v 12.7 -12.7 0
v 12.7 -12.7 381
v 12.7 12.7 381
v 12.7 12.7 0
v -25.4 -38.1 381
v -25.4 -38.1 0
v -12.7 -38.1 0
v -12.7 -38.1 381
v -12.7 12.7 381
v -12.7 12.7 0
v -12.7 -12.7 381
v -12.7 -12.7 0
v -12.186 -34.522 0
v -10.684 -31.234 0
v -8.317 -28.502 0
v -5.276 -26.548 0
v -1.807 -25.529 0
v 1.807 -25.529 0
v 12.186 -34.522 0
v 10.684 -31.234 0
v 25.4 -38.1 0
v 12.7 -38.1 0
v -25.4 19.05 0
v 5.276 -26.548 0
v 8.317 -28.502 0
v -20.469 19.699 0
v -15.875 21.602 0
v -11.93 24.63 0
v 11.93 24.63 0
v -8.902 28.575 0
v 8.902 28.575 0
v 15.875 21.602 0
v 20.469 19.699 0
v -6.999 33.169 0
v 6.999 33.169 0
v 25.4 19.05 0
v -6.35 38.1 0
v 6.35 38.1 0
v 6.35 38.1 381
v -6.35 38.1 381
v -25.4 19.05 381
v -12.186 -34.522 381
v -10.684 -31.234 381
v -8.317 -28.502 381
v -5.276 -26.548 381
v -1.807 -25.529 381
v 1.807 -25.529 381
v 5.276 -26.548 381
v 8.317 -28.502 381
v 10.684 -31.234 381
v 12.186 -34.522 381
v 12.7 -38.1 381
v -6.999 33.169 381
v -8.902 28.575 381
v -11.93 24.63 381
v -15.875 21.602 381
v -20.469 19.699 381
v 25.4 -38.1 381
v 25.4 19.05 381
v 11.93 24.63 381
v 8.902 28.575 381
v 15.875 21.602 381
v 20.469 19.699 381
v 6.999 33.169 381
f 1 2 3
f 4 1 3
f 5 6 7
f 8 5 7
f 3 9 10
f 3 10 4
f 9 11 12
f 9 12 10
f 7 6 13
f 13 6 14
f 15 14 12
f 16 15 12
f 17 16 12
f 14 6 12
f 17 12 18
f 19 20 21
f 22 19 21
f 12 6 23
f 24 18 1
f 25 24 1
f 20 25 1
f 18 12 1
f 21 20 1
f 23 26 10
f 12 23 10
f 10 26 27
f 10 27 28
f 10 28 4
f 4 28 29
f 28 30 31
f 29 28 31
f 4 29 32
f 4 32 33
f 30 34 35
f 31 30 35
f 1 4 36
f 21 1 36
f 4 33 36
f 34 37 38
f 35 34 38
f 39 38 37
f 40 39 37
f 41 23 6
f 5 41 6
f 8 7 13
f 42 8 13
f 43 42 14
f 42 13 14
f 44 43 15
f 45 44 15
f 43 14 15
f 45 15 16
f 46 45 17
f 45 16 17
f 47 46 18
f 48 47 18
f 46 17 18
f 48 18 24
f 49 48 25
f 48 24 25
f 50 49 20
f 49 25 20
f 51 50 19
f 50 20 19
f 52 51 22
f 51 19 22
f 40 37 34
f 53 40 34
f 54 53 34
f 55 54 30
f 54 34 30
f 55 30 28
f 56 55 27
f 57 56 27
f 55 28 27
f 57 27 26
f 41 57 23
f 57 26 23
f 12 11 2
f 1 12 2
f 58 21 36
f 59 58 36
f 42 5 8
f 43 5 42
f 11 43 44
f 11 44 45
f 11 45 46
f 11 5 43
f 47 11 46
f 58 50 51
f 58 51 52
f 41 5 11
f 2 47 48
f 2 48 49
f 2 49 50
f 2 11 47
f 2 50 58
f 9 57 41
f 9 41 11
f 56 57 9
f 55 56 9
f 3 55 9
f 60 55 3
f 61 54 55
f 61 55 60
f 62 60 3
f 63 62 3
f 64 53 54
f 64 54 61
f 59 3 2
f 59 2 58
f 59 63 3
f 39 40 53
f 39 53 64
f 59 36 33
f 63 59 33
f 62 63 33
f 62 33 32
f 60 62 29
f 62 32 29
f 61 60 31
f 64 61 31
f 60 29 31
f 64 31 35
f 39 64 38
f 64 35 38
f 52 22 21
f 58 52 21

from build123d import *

# Parameters (mm, degrees)
F1_W     = 25.4
F1_H     = 25.4
F2_DEPTH = 381


# Not quite as in the source:
# - a feature of the source that left no trace in its solid (it failed there, or was rolled back) is left out


with BuildPart() as f2:
    # F1 (on Top) → F2 (new body)
    with BuildSketch(Plane.XY):
        with BuildLine():
            ThreePointArc((25.4, 19.05), (11.9296158184, 24.6296158184), (6.35, 38.1))
            Line((6.35, 38.1), (-6.35, 38.1))
            ThreePointArc((-6.35, 38.1), (-11.9296158184, 24.6296158184), (-25.4, 19.05))
            Line((-25.4, 19.05), (-25.4, -38.1))
            Line((-25.4, -38.1), (-12.7, -38.1))
            ThreePointArc((-12.7, -38.1), (0, -25.4), (12.7, -38.1))
            Line((12.7, -38.1), (25.4, -38.1))
            Line((25.4, -38.1), (25.4, 19.05))
        make_face()
        Rectangle(F1_W, F1_H, mode=Mode.SUBTRACT)
    extrude(amount=F2_DEPTH)


solid = f2.part
